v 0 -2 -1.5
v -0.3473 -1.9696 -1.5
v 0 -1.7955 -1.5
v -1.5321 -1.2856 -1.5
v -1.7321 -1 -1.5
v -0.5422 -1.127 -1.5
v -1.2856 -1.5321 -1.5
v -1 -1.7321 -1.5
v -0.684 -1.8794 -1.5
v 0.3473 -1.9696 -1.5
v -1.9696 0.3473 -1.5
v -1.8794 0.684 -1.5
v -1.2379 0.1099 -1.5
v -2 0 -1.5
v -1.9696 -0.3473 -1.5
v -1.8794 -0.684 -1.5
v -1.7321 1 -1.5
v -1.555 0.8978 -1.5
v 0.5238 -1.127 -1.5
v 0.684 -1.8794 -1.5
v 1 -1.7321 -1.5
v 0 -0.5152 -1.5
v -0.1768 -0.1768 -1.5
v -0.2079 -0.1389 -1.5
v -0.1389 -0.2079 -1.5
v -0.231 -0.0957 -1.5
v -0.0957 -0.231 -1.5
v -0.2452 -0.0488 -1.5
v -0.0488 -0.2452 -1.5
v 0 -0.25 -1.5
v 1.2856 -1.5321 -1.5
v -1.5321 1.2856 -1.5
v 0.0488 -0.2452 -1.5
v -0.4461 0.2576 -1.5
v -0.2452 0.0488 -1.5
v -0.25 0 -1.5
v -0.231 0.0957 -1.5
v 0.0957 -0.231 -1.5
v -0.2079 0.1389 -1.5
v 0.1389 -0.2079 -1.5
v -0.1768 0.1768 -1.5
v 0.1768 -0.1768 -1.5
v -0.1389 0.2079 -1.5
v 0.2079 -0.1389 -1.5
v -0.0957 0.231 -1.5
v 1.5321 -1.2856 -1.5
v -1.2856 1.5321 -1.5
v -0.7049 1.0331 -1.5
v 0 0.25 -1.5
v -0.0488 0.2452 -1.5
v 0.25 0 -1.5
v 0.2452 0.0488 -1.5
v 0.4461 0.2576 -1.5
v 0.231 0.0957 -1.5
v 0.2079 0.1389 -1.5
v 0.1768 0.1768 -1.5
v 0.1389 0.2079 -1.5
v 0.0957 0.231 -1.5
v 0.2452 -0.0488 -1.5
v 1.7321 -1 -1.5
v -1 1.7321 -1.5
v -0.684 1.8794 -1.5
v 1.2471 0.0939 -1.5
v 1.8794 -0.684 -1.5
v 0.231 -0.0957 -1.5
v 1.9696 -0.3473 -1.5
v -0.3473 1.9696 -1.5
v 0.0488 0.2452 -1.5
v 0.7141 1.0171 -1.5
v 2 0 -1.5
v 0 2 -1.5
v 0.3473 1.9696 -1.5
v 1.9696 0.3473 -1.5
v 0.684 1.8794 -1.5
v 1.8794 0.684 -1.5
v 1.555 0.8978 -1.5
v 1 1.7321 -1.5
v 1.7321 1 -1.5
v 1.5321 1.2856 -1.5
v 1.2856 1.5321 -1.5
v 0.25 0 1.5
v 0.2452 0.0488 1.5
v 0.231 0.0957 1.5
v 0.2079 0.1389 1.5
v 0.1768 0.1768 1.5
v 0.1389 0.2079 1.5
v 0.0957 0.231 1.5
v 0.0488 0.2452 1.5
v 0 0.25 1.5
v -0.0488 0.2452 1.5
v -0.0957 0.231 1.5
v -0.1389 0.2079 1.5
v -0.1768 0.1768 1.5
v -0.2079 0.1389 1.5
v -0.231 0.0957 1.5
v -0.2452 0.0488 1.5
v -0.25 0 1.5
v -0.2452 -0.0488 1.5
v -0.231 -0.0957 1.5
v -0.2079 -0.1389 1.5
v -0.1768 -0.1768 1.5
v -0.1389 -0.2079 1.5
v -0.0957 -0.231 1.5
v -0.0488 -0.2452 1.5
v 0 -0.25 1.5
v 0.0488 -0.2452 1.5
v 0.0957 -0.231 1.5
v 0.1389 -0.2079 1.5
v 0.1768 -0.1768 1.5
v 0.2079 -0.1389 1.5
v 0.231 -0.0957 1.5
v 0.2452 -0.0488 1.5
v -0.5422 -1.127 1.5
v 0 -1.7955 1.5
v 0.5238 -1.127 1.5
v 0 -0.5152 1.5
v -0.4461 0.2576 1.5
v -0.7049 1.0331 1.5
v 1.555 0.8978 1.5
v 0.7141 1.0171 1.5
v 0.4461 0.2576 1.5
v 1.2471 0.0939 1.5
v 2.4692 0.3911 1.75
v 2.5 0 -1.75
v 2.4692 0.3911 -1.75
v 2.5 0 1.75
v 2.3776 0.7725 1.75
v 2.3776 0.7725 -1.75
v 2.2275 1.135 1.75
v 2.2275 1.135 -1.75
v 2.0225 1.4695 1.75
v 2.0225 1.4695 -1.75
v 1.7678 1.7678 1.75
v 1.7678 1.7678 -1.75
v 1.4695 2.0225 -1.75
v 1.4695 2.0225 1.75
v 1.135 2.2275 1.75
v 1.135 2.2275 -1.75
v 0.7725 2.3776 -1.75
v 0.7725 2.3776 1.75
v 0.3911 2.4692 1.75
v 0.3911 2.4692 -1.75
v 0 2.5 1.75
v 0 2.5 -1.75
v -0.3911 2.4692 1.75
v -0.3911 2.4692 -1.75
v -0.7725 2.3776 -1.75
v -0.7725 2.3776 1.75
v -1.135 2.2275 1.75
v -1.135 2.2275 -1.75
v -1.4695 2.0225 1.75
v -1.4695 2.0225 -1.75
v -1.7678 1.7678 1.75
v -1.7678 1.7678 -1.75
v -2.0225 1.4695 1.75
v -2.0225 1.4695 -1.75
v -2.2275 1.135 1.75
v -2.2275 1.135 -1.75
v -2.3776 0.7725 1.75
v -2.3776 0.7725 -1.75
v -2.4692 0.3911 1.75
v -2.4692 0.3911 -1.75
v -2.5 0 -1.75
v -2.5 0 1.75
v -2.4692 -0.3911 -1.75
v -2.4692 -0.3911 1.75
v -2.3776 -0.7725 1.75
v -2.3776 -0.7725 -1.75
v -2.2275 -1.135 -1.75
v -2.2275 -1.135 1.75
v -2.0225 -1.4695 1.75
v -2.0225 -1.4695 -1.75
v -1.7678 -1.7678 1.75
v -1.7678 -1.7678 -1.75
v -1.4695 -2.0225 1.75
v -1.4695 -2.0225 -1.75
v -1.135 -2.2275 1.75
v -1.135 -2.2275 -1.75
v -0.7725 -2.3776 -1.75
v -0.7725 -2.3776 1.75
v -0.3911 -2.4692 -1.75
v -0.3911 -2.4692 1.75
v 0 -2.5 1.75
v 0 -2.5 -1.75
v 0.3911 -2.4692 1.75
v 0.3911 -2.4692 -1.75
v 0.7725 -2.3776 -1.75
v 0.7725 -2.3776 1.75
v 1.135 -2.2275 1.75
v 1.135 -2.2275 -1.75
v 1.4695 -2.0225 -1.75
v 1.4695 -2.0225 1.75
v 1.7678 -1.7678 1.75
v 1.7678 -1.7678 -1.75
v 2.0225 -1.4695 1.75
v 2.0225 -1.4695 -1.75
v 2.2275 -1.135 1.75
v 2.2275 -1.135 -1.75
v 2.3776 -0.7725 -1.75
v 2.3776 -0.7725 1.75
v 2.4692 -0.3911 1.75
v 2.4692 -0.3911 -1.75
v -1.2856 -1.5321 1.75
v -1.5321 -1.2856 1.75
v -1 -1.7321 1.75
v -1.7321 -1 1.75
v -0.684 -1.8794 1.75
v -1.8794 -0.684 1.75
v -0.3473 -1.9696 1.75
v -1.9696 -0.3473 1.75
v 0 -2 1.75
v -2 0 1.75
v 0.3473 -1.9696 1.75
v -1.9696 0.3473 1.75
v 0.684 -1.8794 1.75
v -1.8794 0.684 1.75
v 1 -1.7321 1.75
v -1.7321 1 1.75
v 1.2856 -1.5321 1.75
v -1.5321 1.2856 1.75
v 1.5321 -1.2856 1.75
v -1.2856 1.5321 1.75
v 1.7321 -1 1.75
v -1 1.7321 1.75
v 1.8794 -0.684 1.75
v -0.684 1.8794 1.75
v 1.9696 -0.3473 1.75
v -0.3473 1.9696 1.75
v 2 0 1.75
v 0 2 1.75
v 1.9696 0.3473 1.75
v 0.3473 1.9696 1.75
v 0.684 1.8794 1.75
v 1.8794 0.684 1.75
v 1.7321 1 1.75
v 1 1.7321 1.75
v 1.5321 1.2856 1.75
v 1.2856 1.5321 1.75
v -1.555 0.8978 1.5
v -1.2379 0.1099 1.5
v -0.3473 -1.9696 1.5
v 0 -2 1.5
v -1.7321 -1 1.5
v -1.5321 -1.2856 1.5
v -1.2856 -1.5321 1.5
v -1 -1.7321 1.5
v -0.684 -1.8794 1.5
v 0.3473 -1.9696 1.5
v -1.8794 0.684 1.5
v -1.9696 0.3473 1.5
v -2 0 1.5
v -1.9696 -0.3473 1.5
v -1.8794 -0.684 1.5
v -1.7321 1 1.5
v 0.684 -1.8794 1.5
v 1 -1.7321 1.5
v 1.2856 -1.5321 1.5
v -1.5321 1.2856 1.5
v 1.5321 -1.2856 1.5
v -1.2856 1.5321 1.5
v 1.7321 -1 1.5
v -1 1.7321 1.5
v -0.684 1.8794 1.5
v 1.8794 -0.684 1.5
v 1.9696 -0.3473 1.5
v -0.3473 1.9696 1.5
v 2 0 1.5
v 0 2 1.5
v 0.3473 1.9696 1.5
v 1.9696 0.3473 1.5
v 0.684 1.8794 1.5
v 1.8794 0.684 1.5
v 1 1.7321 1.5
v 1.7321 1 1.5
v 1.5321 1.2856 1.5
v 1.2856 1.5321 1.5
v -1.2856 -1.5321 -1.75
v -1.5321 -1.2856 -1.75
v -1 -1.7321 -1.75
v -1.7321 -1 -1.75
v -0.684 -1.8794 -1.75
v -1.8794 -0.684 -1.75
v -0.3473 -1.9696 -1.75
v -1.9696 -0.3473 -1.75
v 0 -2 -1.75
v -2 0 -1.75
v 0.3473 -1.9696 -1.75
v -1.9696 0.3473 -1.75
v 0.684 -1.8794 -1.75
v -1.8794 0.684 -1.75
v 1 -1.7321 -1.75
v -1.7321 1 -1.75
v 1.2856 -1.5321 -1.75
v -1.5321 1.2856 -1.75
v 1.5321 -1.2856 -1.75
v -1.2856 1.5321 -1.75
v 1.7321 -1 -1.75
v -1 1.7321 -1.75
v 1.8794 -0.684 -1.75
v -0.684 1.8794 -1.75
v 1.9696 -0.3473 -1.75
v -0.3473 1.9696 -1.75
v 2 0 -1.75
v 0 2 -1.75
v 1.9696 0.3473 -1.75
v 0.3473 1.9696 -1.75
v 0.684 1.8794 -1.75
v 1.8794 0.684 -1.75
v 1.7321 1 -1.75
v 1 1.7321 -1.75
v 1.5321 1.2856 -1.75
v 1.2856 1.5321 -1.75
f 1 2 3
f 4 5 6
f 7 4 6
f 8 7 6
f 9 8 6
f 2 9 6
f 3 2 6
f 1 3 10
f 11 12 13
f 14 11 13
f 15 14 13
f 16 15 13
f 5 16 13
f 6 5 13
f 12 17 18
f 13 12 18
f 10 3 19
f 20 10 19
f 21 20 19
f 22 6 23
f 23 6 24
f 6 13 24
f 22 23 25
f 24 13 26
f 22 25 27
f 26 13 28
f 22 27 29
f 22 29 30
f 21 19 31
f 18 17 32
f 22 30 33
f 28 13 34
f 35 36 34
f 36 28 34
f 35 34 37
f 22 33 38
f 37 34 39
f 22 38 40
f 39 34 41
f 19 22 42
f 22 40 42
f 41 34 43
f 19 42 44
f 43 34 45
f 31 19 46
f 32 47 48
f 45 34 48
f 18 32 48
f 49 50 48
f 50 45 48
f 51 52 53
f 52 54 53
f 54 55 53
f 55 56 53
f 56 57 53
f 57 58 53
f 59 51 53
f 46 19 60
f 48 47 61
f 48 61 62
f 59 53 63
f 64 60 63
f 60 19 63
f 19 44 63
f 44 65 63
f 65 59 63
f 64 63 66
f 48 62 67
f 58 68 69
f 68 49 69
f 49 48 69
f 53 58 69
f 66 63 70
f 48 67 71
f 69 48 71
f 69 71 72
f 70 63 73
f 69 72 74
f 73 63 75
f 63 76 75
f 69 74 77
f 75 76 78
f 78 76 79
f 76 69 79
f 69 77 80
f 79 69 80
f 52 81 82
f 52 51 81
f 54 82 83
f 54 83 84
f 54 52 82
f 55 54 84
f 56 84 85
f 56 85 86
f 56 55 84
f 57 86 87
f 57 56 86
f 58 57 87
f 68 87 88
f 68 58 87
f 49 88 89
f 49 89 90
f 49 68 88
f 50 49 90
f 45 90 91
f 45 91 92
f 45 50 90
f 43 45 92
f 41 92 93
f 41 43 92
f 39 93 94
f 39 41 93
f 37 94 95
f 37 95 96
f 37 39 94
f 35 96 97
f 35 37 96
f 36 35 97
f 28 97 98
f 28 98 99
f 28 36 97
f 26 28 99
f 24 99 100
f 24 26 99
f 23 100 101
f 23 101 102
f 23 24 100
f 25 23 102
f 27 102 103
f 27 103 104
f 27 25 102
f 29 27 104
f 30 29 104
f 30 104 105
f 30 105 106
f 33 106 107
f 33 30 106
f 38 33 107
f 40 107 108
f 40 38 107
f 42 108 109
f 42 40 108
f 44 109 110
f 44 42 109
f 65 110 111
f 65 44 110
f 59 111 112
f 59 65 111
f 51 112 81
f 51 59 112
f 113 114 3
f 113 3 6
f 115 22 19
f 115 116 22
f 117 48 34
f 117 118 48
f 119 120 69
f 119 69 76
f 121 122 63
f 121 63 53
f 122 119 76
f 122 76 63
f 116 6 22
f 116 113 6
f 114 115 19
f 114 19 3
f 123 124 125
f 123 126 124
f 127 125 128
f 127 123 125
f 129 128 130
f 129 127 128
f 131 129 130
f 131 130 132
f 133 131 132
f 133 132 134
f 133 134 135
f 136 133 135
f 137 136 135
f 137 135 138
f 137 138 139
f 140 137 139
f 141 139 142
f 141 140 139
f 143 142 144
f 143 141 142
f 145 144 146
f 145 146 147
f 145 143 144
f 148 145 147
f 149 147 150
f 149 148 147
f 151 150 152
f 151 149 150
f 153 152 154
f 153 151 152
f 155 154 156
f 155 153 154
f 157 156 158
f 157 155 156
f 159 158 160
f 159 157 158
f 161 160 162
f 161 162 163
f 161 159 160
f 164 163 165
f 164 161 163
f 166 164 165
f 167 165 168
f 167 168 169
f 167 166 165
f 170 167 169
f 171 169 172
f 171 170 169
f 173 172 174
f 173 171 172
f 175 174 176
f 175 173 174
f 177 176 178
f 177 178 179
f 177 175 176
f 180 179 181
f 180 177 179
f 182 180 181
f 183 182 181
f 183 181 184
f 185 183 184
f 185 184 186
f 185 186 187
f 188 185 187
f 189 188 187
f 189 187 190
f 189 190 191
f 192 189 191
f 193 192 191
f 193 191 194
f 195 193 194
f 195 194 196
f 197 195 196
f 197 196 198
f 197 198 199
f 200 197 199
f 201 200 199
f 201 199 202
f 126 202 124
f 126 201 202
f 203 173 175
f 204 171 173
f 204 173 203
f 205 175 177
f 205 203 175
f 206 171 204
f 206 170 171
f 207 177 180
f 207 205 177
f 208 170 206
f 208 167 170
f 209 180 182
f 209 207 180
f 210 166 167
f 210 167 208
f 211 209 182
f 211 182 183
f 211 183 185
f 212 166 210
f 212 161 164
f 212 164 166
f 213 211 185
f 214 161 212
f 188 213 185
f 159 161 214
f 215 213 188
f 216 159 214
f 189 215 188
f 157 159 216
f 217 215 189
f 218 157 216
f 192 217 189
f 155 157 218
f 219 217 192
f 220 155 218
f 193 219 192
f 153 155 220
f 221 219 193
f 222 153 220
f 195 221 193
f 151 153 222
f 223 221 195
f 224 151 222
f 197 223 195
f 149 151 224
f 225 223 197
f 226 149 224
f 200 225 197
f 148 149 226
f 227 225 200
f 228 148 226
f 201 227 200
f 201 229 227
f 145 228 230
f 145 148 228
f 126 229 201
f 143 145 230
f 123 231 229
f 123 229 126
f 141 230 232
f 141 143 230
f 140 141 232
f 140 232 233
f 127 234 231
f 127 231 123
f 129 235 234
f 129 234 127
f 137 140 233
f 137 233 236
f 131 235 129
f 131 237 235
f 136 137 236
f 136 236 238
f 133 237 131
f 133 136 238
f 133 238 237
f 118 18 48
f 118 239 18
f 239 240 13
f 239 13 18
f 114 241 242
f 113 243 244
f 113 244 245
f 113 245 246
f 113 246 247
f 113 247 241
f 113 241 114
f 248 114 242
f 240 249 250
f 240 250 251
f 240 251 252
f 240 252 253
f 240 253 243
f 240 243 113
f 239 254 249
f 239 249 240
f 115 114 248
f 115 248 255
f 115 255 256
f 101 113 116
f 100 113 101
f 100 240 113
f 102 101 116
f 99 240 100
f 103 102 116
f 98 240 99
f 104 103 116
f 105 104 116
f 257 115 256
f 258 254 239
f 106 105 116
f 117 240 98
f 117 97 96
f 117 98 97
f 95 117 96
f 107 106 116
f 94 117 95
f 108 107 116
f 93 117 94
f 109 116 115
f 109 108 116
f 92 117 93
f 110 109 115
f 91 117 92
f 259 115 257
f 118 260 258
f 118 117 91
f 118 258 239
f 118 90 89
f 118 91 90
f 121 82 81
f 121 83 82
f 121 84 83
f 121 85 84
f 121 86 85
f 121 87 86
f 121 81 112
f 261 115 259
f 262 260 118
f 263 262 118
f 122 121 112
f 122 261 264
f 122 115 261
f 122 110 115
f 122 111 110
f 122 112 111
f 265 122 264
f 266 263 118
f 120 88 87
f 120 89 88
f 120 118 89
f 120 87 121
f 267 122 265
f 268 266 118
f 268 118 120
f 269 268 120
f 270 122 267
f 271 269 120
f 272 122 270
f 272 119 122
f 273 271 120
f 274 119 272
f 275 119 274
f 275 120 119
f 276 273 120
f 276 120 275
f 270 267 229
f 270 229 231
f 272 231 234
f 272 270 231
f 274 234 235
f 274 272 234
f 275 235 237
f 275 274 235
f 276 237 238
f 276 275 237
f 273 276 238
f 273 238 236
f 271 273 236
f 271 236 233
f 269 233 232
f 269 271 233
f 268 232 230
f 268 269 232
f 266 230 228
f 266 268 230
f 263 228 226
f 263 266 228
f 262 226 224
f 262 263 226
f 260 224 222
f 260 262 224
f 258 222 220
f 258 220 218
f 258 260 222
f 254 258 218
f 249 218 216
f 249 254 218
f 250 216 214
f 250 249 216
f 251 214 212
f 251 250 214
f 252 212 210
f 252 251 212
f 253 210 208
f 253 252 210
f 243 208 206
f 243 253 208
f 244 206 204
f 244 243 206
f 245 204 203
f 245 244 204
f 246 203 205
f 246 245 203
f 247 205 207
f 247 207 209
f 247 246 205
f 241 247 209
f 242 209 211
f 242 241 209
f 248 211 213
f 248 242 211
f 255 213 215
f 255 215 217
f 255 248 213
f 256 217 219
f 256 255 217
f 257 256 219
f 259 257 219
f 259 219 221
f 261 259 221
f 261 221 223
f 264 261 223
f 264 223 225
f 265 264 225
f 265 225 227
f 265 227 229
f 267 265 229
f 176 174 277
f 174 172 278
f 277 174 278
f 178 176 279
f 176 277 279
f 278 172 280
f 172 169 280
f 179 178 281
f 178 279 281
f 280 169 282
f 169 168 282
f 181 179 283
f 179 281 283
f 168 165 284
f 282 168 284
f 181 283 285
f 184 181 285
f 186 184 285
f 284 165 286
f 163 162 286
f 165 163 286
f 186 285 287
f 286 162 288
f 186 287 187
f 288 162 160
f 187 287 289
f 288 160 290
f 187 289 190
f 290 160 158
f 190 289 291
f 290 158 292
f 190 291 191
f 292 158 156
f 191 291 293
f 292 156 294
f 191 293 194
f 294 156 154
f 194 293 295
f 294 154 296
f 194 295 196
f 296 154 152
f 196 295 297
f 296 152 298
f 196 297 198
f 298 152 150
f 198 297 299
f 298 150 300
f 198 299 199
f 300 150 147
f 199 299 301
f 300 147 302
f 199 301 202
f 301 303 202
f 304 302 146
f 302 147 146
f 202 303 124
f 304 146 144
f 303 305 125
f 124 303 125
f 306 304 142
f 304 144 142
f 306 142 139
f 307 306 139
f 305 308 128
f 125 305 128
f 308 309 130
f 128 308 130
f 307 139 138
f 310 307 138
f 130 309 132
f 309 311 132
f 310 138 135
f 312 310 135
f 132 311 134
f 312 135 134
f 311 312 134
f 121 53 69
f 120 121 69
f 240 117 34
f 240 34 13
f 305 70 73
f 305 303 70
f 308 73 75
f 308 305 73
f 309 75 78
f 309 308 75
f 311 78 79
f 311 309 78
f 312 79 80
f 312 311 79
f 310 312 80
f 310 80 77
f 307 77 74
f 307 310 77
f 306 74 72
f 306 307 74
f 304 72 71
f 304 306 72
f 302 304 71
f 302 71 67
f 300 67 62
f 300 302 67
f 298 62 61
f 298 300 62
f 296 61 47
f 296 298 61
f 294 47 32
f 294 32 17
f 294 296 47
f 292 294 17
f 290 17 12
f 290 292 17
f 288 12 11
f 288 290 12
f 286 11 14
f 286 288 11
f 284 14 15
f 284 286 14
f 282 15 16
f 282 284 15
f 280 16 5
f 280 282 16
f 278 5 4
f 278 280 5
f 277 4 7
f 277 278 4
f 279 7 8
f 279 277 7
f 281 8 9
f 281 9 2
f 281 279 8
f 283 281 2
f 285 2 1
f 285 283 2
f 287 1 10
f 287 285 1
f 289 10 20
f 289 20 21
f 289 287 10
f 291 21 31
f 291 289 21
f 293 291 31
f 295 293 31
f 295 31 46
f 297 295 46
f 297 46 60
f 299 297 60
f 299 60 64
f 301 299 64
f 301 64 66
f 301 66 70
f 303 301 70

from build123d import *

# Parameters (mm, degrees)
F0_R     = 2
F0_R_2   = 0.25
F1_DEPTH = 1.5
F0_R_3   = 2.5
F2_DEPTH = 1.75


with BuildPart() as f1:
    # F0 (on Top) → F1 (new body, symmetric)
    with BuildSketch(Plane.XY):
        Circle(F0_R)
        Polygon((0.523771, -1.126971), (0, -1.79554), (-0.542237, -1.126971), (0, -0.515168), align=None, mode=Mode.SUBTRACT)
        Polygon((-0.446149, 0.257584), (-1.237871, 0.109887), (-1.554983, 0.89777), (-0.704868, 1.033076), align=None, mode=Mode.SUBTRACT)
        Circle(F0_R_2, mode=Mode.SUBTRACT)
        Polygon((0.446149, 0.257584), (0.7141, 1.017085), (1.554983, 0.89777), (1.247104, 0.093895), align=None, mode=Mode.SUBTRACT)
    extrude(amount=F1_DEPTH, both=True)

    # F0 (on Top) → F2 (join, symmetric)
    with BuildSketch(Plane.XY):
        Circle(F0_R_3)
        Circle(F0_R, mode=Mode.SUBTRACT)
    extrude(amount=F2_DEPTH, both=True)


solid = f1.part
